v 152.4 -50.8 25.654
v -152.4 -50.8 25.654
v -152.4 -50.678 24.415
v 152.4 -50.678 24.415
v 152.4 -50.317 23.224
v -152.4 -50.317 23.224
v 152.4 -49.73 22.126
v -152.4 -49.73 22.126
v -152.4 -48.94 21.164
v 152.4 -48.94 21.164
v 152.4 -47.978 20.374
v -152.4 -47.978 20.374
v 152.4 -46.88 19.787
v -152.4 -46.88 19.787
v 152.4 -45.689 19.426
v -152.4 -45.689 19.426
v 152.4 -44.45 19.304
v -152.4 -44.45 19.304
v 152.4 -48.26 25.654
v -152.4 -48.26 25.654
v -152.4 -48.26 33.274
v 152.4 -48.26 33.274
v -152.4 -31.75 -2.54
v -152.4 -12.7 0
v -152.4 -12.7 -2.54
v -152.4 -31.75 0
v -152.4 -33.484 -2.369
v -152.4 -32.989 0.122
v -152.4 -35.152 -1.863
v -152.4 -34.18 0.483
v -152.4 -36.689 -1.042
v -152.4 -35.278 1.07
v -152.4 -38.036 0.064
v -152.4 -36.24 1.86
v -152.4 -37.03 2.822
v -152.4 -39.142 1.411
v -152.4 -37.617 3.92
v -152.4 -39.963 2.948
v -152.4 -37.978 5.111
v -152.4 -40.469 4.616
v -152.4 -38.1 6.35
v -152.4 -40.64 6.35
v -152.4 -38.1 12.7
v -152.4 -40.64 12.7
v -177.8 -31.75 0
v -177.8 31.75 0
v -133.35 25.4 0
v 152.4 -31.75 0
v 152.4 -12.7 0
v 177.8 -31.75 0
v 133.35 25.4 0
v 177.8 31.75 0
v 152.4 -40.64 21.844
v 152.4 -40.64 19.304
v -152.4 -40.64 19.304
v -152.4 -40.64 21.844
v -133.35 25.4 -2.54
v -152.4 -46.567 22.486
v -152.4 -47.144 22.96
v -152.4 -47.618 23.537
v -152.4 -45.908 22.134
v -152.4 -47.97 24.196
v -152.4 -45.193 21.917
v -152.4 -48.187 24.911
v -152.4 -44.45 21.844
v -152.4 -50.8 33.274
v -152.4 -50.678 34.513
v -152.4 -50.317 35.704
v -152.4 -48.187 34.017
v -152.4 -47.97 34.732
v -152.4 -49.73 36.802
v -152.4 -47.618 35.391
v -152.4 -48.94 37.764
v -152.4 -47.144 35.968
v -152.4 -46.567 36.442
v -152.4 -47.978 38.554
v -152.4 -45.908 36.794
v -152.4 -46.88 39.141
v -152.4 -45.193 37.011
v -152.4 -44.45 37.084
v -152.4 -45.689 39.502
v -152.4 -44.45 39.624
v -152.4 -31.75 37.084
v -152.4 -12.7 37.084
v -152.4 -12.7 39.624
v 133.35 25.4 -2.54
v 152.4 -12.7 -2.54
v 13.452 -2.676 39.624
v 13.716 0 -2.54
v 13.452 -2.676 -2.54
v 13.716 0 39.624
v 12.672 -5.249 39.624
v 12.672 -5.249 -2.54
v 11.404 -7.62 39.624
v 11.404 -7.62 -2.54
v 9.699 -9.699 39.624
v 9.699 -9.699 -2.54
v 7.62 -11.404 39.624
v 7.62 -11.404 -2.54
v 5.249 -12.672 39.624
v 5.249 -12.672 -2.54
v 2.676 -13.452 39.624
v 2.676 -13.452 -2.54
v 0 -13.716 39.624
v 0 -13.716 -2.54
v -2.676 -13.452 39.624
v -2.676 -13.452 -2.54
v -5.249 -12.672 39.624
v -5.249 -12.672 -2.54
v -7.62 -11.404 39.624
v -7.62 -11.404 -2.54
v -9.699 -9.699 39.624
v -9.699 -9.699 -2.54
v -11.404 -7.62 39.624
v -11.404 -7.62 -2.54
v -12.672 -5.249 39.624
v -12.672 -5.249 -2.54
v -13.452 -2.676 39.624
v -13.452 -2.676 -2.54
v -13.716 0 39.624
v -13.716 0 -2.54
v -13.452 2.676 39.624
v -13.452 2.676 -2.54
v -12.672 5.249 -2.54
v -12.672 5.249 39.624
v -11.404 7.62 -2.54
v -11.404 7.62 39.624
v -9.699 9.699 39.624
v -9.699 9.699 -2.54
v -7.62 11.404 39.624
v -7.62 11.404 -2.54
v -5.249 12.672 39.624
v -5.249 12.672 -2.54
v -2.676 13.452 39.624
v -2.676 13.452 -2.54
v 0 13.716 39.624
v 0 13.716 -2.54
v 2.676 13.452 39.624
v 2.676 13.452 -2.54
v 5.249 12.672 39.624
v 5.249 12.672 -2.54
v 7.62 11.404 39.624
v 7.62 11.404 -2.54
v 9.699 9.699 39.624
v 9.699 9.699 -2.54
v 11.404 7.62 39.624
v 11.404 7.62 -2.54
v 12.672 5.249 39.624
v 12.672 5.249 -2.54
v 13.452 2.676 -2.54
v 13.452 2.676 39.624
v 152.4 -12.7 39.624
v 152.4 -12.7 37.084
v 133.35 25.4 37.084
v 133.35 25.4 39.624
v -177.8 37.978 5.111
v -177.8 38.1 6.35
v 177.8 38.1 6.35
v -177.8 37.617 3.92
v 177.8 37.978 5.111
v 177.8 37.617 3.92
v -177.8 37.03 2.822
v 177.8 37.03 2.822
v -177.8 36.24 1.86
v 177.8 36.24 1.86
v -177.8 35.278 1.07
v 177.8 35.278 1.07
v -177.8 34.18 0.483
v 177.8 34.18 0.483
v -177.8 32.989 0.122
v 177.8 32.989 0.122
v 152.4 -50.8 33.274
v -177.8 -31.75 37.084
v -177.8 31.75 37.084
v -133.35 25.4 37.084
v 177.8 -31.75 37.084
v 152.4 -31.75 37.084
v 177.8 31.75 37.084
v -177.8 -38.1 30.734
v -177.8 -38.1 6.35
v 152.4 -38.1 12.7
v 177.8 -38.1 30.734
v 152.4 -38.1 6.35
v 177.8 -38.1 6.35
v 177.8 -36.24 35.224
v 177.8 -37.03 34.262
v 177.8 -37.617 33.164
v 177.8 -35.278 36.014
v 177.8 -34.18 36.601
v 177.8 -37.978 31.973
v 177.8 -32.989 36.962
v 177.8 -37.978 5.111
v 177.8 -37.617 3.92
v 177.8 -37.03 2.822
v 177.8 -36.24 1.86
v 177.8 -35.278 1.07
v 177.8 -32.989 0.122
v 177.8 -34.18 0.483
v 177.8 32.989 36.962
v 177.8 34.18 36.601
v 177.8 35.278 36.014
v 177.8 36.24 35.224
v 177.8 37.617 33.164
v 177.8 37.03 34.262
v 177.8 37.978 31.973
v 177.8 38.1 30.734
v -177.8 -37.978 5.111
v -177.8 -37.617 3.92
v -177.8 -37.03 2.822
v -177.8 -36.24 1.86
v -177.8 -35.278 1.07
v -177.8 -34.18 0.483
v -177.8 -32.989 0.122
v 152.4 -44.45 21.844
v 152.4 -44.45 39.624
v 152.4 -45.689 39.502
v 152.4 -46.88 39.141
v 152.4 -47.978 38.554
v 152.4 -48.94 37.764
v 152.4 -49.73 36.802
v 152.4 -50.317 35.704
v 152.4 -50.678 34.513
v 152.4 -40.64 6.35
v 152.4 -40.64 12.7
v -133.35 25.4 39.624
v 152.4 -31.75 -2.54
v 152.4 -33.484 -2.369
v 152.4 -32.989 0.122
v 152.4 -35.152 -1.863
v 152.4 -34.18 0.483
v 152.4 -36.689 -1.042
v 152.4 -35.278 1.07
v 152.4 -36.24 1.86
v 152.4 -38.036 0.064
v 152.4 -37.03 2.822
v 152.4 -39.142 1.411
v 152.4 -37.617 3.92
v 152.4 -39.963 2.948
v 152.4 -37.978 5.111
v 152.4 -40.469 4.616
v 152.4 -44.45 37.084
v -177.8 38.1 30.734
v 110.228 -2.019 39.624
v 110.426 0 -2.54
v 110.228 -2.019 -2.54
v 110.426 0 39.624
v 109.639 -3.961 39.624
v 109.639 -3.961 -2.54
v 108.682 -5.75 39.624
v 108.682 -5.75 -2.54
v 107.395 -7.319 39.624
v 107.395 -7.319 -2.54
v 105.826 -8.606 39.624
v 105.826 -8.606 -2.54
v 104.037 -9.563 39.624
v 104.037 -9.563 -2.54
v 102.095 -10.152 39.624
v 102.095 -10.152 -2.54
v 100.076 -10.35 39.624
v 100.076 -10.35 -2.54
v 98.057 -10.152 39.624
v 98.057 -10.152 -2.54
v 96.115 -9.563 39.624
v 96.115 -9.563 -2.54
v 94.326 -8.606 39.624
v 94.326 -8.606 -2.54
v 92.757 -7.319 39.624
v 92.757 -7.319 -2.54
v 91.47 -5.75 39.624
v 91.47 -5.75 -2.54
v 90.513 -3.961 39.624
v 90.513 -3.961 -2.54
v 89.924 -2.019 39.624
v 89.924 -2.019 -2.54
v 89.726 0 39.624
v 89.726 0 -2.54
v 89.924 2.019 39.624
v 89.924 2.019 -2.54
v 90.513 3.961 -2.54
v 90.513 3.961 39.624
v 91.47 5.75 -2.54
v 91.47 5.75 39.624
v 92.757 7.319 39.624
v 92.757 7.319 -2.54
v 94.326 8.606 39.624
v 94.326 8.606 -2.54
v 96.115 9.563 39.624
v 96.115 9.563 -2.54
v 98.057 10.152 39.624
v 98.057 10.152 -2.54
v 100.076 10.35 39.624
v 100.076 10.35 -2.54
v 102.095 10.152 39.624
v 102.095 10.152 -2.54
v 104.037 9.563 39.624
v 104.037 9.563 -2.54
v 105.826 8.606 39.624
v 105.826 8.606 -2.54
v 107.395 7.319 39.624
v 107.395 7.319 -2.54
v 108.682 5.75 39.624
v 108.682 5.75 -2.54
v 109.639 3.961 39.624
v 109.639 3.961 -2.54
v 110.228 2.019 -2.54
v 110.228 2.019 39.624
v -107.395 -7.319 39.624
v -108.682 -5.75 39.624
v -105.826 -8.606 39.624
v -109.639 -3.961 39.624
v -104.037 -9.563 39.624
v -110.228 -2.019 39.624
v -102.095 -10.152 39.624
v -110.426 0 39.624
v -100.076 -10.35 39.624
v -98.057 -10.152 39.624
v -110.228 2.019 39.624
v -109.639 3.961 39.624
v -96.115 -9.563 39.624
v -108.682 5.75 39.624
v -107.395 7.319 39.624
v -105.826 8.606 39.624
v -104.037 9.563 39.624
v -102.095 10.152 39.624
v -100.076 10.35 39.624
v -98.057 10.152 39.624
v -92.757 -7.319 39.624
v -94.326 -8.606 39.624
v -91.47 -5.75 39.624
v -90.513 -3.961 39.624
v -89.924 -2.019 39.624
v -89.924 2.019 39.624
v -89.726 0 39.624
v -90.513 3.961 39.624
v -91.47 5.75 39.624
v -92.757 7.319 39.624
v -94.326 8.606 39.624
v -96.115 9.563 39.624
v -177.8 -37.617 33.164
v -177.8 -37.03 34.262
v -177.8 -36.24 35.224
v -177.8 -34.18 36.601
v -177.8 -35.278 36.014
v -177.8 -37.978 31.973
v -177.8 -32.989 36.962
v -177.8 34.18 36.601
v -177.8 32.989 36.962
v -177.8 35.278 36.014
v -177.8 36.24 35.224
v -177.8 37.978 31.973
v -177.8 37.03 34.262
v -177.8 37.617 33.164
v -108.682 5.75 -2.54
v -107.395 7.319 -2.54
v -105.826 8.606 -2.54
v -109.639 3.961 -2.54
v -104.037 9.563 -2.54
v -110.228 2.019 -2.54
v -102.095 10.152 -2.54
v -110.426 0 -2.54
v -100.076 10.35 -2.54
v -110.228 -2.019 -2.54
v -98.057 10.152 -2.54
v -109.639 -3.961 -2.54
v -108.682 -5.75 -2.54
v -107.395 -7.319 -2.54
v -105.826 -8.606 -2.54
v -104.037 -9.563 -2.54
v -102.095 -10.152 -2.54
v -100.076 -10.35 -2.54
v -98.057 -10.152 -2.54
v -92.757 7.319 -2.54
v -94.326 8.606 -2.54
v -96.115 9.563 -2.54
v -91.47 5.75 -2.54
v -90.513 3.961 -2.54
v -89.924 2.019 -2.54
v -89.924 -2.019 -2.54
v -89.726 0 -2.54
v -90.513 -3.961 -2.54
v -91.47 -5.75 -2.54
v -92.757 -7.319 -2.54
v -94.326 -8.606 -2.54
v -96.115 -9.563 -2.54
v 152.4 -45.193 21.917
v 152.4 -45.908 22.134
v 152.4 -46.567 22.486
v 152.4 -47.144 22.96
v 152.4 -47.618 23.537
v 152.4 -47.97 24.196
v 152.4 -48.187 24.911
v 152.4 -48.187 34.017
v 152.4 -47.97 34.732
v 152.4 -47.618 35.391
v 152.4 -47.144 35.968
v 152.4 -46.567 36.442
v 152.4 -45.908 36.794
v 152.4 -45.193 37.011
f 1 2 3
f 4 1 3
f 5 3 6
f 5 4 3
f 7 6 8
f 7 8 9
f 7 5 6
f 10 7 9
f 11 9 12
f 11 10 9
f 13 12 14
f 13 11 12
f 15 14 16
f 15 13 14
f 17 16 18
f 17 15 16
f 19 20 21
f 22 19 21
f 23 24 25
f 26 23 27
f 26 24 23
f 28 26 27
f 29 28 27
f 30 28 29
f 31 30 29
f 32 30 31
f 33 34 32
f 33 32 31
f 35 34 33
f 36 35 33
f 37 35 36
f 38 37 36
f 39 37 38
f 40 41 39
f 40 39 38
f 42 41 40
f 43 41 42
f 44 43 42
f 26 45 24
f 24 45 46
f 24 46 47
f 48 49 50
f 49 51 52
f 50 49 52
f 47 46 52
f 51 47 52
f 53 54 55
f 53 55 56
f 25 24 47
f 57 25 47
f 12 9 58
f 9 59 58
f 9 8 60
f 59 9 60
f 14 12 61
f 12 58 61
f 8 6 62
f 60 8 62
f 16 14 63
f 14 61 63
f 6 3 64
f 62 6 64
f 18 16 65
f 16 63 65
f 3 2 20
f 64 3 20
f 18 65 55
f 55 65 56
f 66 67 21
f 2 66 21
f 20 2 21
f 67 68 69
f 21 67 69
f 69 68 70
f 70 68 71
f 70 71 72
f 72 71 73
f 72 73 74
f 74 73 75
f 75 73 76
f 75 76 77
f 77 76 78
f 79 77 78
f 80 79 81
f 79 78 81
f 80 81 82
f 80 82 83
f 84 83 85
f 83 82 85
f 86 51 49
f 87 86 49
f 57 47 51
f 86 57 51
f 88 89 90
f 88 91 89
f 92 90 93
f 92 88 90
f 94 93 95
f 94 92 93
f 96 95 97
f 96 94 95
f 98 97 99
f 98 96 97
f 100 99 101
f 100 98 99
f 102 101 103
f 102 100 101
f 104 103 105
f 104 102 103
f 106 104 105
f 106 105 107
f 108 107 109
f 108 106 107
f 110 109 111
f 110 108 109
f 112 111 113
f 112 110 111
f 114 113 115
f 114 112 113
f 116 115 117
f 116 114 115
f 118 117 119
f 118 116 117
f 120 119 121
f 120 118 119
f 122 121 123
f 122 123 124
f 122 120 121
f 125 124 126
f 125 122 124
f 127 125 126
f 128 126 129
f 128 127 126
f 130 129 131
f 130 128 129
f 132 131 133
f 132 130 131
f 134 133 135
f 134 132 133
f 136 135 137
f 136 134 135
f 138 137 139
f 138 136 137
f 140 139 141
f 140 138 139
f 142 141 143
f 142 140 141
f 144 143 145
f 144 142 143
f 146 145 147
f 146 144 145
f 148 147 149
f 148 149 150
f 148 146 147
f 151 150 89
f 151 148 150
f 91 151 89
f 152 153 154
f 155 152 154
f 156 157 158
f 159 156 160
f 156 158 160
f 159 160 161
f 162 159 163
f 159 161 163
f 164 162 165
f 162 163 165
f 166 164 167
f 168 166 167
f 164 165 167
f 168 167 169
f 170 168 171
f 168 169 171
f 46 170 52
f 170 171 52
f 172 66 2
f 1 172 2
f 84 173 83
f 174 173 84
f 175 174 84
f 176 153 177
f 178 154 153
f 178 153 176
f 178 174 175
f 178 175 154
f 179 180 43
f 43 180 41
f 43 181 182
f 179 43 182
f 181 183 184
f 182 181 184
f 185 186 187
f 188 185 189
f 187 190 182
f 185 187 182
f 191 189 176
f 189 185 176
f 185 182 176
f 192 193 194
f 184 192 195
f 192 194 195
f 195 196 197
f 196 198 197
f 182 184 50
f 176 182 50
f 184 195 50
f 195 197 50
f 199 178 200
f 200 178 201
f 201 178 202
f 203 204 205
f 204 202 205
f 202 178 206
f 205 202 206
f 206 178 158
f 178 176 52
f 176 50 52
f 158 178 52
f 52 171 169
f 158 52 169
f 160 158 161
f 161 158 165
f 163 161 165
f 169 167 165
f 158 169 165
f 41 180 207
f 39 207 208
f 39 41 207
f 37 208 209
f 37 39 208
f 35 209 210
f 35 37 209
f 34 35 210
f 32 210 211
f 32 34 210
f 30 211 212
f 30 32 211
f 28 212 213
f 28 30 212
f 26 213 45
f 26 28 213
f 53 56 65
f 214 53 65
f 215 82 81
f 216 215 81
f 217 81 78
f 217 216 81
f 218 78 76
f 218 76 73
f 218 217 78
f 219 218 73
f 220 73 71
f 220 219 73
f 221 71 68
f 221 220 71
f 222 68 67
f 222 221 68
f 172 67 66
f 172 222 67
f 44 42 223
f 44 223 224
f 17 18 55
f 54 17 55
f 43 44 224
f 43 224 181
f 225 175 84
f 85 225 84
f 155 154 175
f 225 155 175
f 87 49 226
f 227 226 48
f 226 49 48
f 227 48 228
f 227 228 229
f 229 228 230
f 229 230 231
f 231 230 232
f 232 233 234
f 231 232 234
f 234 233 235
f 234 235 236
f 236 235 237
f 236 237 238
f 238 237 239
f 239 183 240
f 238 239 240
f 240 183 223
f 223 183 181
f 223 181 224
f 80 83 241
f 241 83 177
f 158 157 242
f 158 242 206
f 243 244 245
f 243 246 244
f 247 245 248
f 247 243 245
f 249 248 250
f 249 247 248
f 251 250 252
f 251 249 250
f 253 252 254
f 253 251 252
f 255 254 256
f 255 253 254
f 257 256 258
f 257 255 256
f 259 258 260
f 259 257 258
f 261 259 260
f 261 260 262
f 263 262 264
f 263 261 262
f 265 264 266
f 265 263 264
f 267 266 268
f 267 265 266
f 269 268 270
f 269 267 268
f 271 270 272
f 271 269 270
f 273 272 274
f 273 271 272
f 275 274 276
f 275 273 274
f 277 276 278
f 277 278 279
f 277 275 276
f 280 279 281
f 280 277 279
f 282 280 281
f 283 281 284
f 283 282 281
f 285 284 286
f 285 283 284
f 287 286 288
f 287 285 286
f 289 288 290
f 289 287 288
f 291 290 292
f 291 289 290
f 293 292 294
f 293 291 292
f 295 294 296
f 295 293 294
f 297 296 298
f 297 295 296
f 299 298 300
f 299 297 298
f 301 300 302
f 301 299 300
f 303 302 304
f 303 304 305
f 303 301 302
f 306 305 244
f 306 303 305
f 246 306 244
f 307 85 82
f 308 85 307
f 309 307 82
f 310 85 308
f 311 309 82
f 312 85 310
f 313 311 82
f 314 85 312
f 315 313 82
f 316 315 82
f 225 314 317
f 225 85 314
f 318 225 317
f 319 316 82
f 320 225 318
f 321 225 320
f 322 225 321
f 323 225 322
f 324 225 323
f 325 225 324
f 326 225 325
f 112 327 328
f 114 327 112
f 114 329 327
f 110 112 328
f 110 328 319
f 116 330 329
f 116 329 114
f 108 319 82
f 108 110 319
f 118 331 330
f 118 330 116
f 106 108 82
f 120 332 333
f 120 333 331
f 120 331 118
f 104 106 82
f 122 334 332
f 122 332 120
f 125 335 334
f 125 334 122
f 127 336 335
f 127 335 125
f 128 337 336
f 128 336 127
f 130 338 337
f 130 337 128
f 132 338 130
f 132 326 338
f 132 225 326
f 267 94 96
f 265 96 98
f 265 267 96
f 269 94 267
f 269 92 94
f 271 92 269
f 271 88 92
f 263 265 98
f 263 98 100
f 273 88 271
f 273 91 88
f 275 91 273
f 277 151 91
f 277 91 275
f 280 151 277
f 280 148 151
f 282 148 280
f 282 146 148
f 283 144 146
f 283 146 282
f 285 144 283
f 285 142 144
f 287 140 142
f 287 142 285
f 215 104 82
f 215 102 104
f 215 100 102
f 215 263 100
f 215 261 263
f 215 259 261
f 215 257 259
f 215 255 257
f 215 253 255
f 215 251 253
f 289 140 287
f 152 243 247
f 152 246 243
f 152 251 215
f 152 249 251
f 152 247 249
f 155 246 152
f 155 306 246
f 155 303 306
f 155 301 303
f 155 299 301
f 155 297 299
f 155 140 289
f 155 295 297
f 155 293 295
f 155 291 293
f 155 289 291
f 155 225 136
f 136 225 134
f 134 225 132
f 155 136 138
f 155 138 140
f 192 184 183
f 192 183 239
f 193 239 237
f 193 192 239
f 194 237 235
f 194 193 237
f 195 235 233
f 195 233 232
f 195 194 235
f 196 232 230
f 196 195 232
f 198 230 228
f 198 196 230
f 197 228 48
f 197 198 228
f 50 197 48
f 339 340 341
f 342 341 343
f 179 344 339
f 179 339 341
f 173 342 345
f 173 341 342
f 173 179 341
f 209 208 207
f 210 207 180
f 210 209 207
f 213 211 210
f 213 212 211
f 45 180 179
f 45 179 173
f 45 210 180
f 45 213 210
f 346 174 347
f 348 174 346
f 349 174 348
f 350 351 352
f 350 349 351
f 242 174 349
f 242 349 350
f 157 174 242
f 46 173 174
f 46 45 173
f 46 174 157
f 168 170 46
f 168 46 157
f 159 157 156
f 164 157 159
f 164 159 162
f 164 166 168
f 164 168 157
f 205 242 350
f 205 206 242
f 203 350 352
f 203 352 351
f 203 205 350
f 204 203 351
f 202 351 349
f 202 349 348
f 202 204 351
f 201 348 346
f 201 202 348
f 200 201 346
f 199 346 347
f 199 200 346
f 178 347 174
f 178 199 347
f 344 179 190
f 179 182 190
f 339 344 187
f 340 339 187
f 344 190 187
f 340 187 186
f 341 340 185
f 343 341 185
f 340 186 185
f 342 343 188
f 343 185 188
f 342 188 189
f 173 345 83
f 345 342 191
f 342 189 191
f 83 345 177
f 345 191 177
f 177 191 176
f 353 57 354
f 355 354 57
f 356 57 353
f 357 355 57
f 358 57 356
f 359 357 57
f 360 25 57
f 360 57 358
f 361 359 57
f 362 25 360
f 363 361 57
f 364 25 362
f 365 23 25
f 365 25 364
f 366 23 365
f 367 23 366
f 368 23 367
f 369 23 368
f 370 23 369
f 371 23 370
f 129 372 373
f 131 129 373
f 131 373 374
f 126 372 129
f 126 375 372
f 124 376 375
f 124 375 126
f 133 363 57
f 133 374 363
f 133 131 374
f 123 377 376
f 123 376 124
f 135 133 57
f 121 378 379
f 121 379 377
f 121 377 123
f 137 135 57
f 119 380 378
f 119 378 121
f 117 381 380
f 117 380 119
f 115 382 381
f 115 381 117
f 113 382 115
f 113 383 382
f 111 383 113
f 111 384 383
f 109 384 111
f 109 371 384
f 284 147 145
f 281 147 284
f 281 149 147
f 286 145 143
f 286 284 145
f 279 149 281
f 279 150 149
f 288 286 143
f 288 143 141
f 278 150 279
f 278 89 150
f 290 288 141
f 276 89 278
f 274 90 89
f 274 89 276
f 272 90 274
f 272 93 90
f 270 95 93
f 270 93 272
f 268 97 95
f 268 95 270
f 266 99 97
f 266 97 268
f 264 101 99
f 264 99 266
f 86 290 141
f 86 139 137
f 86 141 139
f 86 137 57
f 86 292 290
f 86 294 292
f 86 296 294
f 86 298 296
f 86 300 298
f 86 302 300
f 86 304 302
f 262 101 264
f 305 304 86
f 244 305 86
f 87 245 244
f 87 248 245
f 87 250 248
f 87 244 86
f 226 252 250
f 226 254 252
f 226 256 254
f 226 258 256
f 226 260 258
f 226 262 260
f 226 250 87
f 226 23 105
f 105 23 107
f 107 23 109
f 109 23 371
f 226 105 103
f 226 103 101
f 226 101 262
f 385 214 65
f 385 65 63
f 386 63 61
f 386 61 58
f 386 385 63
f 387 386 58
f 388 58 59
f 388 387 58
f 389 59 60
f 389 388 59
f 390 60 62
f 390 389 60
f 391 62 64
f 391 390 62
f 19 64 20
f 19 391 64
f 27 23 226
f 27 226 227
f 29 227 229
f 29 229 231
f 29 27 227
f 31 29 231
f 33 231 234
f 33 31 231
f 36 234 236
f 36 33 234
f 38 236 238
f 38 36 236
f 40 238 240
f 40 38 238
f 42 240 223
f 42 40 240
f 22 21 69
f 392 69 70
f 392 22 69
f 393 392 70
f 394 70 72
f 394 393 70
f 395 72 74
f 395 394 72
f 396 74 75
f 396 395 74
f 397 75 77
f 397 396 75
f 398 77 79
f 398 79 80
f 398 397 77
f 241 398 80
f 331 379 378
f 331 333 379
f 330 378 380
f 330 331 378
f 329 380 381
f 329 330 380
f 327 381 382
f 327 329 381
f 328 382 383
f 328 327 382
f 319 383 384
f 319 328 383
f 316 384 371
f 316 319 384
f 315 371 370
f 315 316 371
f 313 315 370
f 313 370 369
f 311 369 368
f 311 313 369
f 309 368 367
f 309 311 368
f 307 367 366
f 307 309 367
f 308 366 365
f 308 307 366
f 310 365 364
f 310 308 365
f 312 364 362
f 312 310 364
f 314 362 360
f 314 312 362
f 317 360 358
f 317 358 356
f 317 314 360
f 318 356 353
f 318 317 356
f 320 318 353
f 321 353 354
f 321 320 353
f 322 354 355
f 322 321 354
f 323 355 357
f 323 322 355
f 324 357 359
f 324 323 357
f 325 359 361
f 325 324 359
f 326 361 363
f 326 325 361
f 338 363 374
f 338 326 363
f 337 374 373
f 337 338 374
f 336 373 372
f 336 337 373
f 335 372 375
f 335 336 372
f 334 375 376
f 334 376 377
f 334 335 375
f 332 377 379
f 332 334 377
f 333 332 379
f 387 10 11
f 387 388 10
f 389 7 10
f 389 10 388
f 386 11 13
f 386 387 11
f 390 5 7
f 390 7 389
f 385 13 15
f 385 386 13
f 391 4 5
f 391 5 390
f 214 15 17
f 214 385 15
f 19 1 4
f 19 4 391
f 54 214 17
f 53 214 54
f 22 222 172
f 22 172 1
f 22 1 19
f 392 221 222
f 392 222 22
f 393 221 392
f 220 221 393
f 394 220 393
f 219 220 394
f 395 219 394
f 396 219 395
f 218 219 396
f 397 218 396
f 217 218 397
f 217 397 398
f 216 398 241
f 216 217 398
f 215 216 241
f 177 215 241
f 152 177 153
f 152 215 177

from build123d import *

# Parameters (mm, degrees)
F0_W      = 355.6
F0_H      = 76.2
F0_R      = 10.3505
F0_R_2    = 13.716
F1_DEPTH  = 37.084
F2_R      = 6.35
F3_W      = 304.8
F3_H      = 12.7
F3_R      = 10.3505
F3_R_2    = 13.716
F4_DEPTH  = 2.54
F5_R      = 10.3505
F5_R_2    = 13.716
F6_DEPTH  = 2.54
F8_DEPTH  = 304.8
F10_DEPTH = 304.8


with BuildPart() as f1:
    # F0 (on Top) → F1 (new body)
    with BuildSketch(Plane.XY):
        Rectangle(F0_W, F0_H)
        with Locations((-100.076, 0)):
            Circle(F0_R, mode=Mode.SUBTRACT)
        Circle(F0_R_2, mode=Mode.SUBTRACT)
        with Locations((100.076, 0)):
            Circle(F0_R, mode=Mode.SUBTRACT)
    extrude(amount=F1_DEPTH)

    # F2
    f2_edges = [f1.edges().sort_by_distance(p)[0] for p in [
        (0, -38.1, 37.084),
        (0, -38.1, 0),
        (0, 38.1, 37.084),
        (0, 38.1, 0),
    ]]
    fillet(f2_edges, radius=F2_R)

    # F3 (on face) → F4 (join)
    with BuildSketch(Plane.XY.offset(37.084)):
        with Locations((0, -38.1)):
            Rectangle(F3_W, F3_H)
        Polygon((-152.4, -12.7), (-152.4, -31.75), (152.4, -31.75), (152.4, -12.7), (133.35, 25.4), (-133.35, 25.4), align=None)
        with Locations((-100.076, 0)):
            Circle(F3_R, mode=Mode.SUBTRACT)
        Circle(F3_R_2, mode=Mode.SUBTRACT)
        with Locations((100.076, 0)):
            Circle(F3_R, mode=Mode.SUBTRACT)
    extrude(amount=F4_DEPTH)

    # F5 (on face) → F6 (join)
    with BuildSketch(Plane(origin=(0, 0, 0), x_dir=(1, 0, 0), z_dir=(0, 0, -1))):
        Polygon((-152.4, 12.7), (-133.35, -25.4), (133.35, -25.4), (152.4, 12.7), (152.4, 31.75), (-152.4, 31.75), align=None)
        with Locations((-100.076, 0)):
            Circle(F5_R, mode=Mode.SUBTRACT)
        Circle(F5_R_2, mode=Mode.SUBTRACT)
        with Locations((100.076, 0)):
            Circle(F5_R, mode=Mode.SUBTRACT)
    extrude(amount=F6_DEPTH)

    # F7 (on face) → F8 (join)
    with BuildSketch(Plane.YZ.offset(152.4)):
        with BuildLine():
            ThreePointArc((-48.26, 33.274), (-47.1440768363, 35.9680768363), (-44.45, 37.084))
            Line((-44.45, 37.084), (-44.45, 39.624))
            ThreePointArc((-44.45, 39.624), (-48.9401280605, 37.7641280605), (-50.8, 33.274))
            Line((-50.8, 33.274), (-50.8, 25.654))
            ThreePointArc((-50.8, 25.654), (-48.9401280605, 21.1638719395), (-44.45, 19.304))
            Line((-44.45, 19.304), (-40.64, 19.304))
            Line((-40.64, 19.304), (-40.64, 21.844))
            Line((-40.64, 21.844), (-44.45, 21.844))
            ThreePointArc((-44.45, 21.844), (-47.1440768363, 22.9599231637), (-48.26, 25.654))
            Line((-48.26, 25.654), (-48.26, 33.274))
        make_face()
    extrude(amount=-F8_DEPTH)

    # F9 (on face) → F10 (join)
    with BuildSketch(Plane(origin=(-152.4, 0, 0), x_dir=(0, -1, 0), z_dir=(-1, 0, 0))):
        with BuildLine():
            ThreePointArc((31.75, -2.54), (38.0361792847, 0.0638207153), (40.64, 6.35))
            Line((40.64, 6.35), (40.64, 12.7))
            Line((40.64, 12.7), (38.1, 12.7))
            Line((38.1, 12.7), (38.1, 6.35))
            ThreePointArc((38.1, 6.35), (36.2401280605, 1.8598719395), (31.75, 0))
            Line((31.75, 0), (31.75, -2.54))
        make_face()
    extrude(amount=-F10_DEPTH)


solid = f1.part
